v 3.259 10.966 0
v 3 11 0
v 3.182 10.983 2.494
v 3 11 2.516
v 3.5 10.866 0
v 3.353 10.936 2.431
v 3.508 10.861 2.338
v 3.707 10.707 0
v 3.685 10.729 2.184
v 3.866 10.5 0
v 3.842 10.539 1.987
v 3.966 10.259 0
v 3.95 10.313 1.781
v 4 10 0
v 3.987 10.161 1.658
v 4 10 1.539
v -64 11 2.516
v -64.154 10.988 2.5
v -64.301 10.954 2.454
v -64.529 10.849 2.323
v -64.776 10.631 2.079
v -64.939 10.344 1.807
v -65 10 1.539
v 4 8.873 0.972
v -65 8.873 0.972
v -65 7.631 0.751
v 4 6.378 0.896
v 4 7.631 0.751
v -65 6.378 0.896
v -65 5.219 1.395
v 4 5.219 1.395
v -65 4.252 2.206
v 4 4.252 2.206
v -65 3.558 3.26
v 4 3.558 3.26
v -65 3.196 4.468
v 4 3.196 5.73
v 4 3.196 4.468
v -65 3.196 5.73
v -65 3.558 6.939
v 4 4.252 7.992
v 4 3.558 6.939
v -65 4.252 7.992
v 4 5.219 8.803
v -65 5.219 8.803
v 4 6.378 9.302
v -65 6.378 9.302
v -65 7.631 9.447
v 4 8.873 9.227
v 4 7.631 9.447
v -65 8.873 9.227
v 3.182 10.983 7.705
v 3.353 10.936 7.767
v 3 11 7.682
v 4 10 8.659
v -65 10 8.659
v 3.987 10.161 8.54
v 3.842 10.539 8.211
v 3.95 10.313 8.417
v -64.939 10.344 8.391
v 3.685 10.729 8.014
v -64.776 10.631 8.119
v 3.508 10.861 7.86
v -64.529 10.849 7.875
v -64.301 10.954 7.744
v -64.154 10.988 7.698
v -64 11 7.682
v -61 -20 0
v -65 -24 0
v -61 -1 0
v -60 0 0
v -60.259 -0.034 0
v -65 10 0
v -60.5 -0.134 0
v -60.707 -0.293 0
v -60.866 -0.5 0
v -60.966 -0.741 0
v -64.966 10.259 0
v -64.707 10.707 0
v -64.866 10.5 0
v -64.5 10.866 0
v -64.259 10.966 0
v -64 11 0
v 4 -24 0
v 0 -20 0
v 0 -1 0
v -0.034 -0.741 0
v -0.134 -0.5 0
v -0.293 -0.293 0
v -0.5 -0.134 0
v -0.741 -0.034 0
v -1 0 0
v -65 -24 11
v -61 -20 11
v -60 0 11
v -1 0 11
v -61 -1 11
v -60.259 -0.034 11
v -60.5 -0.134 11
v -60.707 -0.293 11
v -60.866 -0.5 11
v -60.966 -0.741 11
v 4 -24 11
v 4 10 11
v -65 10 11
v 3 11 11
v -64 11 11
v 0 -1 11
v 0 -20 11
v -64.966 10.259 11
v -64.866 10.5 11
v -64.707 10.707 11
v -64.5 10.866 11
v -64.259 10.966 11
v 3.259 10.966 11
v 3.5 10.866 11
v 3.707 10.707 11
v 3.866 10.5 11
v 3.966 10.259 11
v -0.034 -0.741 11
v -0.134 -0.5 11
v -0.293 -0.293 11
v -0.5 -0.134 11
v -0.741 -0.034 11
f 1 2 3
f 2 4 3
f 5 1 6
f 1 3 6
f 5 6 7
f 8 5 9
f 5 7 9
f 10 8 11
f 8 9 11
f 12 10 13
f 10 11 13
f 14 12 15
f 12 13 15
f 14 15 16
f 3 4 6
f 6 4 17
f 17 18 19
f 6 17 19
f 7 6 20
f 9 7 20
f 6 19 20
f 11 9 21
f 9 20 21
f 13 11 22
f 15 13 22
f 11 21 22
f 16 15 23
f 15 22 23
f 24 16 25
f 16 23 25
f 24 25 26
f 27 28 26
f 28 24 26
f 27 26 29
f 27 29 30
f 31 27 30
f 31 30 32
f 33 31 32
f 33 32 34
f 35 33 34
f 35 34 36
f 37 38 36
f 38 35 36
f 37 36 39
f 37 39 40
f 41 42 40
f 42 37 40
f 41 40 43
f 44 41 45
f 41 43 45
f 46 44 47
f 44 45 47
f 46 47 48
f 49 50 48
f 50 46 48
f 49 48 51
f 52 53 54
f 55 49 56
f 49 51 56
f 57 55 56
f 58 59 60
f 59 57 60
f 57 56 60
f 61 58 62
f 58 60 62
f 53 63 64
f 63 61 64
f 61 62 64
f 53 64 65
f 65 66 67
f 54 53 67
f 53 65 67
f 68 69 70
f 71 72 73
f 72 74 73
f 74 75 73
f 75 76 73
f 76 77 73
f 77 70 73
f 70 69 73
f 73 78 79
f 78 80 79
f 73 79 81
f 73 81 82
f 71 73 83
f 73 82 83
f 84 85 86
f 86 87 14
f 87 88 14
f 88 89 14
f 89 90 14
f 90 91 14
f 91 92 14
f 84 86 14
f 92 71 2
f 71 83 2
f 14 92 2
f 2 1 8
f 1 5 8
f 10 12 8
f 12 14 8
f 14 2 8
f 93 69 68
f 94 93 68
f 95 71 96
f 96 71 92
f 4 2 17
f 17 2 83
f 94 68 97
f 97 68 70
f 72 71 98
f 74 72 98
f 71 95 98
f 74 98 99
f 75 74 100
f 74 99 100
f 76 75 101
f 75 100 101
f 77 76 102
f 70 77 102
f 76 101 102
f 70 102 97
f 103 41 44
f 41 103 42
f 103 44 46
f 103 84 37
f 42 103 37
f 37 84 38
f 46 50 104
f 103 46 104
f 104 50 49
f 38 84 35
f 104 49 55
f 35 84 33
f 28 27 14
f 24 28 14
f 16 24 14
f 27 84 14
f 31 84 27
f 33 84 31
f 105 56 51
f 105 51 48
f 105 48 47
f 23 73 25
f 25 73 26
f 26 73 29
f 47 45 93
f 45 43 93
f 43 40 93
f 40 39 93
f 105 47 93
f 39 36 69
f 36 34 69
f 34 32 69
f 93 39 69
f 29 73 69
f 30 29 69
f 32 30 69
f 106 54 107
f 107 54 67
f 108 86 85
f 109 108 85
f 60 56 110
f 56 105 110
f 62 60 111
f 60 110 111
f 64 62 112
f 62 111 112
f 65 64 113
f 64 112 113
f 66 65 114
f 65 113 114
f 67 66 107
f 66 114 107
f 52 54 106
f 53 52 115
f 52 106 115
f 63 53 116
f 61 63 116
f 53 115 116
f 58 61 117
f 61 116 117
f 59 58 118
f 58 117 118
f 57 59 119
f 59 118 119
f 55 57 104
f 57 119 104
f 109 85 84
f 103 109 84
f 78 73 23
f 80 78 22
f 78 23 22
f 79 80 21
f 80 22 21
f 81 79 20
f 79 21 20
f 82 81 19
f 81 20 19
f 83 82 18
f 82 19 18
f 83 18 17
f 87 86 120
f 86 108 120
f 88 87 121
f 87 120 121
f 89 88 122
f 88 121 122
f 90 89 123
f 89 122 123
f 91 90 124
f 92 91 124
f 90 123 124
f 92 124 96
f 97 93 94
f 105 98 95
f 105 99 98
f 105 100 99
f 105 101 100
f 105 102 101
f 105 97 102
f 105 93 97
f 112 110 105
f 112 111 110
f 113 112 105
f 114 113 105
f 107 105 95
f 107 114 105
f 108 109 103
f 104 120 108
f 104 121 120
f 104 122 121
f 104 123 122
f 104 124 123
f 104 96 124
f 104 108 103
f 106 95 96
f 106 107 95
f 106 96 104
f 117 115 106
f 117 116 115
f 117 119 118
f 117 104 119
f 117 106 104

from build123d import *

# Parameters (mm, degrees)
F1_DEPTH    = 11
F2_T1_DEPTH = 36.7168298797
F3_R        = 4.35
F4_DEPTH    = 69.001
F5_T1_DEPTH = 36.7168298797
F6_R        = 1


# Not quite as in the source:
# - a fillet or chamfer that OpenCascade refuses, or shapes differently, is made with other operations: its cross-section is extruded or revolved along the edge and cut away or added


with BuildPart() as f1:
    # F0 (on Top) → F1 (new body)
    with BuildSketch(Plane.XY):
        Polygon((-65, -25), (-61, -25), (-61, 0), (0, 0), (0, -25), (4, -25), (4, 11), (-65, 11), align=None)
    extrude(amount=F1_DEPTH)

    # F2: chamfer of 5 on 1 edges, made by hand

    # F2_s2 → F2_t1 (cut)
    with BuildSketch(Plane.XY.offset(-12.8584149398)):
        Polygon((0, -20), (5, -25), (0, -25), align=None)
    extrude(amount=F2_T1_DEPTH, mode=Mode.SUBTRACT)

    # F3 (on face) → F4 (cut, through all)
    with BuildSketch(Plane(origin=(-65, 0, 0), x_dir=(0, -1, 0), z_dir=(-1, 0, 0))):
        with Locations((-7.5, 5.0990604796)):
            Circle(F3_R)
    extrude(amount=-F4_DEPTH, mode=Mode.SUBTRACT)

    # F5: chamfer of 5 on 1 edges, made by hand

    # F5_s2 → F5_t1 (cut)
    with BuildSketch(Plane.XY.offset(-12.8584149398)):
        Polygon((-66, -25), (-61, -20), (-61, -25), align=None)
    extrude(amount=F5_T1_DEPTH, mode=Mode.SUBTRACT)

    # F6
    f6_edges = [f1.edges().sort_by_distance(p)[0] for p in [
        (-61, 0, 5.5),
        (0, 0, 5.5),
        (4, 11, 9.341089),
        (4, 11, 1.257971),
        (-65, 11, 9.341089),
        (-65, 11, 1.257971),
    ]]
    fillet(f6_edges, radius=F6_R)


solid = f1.part
